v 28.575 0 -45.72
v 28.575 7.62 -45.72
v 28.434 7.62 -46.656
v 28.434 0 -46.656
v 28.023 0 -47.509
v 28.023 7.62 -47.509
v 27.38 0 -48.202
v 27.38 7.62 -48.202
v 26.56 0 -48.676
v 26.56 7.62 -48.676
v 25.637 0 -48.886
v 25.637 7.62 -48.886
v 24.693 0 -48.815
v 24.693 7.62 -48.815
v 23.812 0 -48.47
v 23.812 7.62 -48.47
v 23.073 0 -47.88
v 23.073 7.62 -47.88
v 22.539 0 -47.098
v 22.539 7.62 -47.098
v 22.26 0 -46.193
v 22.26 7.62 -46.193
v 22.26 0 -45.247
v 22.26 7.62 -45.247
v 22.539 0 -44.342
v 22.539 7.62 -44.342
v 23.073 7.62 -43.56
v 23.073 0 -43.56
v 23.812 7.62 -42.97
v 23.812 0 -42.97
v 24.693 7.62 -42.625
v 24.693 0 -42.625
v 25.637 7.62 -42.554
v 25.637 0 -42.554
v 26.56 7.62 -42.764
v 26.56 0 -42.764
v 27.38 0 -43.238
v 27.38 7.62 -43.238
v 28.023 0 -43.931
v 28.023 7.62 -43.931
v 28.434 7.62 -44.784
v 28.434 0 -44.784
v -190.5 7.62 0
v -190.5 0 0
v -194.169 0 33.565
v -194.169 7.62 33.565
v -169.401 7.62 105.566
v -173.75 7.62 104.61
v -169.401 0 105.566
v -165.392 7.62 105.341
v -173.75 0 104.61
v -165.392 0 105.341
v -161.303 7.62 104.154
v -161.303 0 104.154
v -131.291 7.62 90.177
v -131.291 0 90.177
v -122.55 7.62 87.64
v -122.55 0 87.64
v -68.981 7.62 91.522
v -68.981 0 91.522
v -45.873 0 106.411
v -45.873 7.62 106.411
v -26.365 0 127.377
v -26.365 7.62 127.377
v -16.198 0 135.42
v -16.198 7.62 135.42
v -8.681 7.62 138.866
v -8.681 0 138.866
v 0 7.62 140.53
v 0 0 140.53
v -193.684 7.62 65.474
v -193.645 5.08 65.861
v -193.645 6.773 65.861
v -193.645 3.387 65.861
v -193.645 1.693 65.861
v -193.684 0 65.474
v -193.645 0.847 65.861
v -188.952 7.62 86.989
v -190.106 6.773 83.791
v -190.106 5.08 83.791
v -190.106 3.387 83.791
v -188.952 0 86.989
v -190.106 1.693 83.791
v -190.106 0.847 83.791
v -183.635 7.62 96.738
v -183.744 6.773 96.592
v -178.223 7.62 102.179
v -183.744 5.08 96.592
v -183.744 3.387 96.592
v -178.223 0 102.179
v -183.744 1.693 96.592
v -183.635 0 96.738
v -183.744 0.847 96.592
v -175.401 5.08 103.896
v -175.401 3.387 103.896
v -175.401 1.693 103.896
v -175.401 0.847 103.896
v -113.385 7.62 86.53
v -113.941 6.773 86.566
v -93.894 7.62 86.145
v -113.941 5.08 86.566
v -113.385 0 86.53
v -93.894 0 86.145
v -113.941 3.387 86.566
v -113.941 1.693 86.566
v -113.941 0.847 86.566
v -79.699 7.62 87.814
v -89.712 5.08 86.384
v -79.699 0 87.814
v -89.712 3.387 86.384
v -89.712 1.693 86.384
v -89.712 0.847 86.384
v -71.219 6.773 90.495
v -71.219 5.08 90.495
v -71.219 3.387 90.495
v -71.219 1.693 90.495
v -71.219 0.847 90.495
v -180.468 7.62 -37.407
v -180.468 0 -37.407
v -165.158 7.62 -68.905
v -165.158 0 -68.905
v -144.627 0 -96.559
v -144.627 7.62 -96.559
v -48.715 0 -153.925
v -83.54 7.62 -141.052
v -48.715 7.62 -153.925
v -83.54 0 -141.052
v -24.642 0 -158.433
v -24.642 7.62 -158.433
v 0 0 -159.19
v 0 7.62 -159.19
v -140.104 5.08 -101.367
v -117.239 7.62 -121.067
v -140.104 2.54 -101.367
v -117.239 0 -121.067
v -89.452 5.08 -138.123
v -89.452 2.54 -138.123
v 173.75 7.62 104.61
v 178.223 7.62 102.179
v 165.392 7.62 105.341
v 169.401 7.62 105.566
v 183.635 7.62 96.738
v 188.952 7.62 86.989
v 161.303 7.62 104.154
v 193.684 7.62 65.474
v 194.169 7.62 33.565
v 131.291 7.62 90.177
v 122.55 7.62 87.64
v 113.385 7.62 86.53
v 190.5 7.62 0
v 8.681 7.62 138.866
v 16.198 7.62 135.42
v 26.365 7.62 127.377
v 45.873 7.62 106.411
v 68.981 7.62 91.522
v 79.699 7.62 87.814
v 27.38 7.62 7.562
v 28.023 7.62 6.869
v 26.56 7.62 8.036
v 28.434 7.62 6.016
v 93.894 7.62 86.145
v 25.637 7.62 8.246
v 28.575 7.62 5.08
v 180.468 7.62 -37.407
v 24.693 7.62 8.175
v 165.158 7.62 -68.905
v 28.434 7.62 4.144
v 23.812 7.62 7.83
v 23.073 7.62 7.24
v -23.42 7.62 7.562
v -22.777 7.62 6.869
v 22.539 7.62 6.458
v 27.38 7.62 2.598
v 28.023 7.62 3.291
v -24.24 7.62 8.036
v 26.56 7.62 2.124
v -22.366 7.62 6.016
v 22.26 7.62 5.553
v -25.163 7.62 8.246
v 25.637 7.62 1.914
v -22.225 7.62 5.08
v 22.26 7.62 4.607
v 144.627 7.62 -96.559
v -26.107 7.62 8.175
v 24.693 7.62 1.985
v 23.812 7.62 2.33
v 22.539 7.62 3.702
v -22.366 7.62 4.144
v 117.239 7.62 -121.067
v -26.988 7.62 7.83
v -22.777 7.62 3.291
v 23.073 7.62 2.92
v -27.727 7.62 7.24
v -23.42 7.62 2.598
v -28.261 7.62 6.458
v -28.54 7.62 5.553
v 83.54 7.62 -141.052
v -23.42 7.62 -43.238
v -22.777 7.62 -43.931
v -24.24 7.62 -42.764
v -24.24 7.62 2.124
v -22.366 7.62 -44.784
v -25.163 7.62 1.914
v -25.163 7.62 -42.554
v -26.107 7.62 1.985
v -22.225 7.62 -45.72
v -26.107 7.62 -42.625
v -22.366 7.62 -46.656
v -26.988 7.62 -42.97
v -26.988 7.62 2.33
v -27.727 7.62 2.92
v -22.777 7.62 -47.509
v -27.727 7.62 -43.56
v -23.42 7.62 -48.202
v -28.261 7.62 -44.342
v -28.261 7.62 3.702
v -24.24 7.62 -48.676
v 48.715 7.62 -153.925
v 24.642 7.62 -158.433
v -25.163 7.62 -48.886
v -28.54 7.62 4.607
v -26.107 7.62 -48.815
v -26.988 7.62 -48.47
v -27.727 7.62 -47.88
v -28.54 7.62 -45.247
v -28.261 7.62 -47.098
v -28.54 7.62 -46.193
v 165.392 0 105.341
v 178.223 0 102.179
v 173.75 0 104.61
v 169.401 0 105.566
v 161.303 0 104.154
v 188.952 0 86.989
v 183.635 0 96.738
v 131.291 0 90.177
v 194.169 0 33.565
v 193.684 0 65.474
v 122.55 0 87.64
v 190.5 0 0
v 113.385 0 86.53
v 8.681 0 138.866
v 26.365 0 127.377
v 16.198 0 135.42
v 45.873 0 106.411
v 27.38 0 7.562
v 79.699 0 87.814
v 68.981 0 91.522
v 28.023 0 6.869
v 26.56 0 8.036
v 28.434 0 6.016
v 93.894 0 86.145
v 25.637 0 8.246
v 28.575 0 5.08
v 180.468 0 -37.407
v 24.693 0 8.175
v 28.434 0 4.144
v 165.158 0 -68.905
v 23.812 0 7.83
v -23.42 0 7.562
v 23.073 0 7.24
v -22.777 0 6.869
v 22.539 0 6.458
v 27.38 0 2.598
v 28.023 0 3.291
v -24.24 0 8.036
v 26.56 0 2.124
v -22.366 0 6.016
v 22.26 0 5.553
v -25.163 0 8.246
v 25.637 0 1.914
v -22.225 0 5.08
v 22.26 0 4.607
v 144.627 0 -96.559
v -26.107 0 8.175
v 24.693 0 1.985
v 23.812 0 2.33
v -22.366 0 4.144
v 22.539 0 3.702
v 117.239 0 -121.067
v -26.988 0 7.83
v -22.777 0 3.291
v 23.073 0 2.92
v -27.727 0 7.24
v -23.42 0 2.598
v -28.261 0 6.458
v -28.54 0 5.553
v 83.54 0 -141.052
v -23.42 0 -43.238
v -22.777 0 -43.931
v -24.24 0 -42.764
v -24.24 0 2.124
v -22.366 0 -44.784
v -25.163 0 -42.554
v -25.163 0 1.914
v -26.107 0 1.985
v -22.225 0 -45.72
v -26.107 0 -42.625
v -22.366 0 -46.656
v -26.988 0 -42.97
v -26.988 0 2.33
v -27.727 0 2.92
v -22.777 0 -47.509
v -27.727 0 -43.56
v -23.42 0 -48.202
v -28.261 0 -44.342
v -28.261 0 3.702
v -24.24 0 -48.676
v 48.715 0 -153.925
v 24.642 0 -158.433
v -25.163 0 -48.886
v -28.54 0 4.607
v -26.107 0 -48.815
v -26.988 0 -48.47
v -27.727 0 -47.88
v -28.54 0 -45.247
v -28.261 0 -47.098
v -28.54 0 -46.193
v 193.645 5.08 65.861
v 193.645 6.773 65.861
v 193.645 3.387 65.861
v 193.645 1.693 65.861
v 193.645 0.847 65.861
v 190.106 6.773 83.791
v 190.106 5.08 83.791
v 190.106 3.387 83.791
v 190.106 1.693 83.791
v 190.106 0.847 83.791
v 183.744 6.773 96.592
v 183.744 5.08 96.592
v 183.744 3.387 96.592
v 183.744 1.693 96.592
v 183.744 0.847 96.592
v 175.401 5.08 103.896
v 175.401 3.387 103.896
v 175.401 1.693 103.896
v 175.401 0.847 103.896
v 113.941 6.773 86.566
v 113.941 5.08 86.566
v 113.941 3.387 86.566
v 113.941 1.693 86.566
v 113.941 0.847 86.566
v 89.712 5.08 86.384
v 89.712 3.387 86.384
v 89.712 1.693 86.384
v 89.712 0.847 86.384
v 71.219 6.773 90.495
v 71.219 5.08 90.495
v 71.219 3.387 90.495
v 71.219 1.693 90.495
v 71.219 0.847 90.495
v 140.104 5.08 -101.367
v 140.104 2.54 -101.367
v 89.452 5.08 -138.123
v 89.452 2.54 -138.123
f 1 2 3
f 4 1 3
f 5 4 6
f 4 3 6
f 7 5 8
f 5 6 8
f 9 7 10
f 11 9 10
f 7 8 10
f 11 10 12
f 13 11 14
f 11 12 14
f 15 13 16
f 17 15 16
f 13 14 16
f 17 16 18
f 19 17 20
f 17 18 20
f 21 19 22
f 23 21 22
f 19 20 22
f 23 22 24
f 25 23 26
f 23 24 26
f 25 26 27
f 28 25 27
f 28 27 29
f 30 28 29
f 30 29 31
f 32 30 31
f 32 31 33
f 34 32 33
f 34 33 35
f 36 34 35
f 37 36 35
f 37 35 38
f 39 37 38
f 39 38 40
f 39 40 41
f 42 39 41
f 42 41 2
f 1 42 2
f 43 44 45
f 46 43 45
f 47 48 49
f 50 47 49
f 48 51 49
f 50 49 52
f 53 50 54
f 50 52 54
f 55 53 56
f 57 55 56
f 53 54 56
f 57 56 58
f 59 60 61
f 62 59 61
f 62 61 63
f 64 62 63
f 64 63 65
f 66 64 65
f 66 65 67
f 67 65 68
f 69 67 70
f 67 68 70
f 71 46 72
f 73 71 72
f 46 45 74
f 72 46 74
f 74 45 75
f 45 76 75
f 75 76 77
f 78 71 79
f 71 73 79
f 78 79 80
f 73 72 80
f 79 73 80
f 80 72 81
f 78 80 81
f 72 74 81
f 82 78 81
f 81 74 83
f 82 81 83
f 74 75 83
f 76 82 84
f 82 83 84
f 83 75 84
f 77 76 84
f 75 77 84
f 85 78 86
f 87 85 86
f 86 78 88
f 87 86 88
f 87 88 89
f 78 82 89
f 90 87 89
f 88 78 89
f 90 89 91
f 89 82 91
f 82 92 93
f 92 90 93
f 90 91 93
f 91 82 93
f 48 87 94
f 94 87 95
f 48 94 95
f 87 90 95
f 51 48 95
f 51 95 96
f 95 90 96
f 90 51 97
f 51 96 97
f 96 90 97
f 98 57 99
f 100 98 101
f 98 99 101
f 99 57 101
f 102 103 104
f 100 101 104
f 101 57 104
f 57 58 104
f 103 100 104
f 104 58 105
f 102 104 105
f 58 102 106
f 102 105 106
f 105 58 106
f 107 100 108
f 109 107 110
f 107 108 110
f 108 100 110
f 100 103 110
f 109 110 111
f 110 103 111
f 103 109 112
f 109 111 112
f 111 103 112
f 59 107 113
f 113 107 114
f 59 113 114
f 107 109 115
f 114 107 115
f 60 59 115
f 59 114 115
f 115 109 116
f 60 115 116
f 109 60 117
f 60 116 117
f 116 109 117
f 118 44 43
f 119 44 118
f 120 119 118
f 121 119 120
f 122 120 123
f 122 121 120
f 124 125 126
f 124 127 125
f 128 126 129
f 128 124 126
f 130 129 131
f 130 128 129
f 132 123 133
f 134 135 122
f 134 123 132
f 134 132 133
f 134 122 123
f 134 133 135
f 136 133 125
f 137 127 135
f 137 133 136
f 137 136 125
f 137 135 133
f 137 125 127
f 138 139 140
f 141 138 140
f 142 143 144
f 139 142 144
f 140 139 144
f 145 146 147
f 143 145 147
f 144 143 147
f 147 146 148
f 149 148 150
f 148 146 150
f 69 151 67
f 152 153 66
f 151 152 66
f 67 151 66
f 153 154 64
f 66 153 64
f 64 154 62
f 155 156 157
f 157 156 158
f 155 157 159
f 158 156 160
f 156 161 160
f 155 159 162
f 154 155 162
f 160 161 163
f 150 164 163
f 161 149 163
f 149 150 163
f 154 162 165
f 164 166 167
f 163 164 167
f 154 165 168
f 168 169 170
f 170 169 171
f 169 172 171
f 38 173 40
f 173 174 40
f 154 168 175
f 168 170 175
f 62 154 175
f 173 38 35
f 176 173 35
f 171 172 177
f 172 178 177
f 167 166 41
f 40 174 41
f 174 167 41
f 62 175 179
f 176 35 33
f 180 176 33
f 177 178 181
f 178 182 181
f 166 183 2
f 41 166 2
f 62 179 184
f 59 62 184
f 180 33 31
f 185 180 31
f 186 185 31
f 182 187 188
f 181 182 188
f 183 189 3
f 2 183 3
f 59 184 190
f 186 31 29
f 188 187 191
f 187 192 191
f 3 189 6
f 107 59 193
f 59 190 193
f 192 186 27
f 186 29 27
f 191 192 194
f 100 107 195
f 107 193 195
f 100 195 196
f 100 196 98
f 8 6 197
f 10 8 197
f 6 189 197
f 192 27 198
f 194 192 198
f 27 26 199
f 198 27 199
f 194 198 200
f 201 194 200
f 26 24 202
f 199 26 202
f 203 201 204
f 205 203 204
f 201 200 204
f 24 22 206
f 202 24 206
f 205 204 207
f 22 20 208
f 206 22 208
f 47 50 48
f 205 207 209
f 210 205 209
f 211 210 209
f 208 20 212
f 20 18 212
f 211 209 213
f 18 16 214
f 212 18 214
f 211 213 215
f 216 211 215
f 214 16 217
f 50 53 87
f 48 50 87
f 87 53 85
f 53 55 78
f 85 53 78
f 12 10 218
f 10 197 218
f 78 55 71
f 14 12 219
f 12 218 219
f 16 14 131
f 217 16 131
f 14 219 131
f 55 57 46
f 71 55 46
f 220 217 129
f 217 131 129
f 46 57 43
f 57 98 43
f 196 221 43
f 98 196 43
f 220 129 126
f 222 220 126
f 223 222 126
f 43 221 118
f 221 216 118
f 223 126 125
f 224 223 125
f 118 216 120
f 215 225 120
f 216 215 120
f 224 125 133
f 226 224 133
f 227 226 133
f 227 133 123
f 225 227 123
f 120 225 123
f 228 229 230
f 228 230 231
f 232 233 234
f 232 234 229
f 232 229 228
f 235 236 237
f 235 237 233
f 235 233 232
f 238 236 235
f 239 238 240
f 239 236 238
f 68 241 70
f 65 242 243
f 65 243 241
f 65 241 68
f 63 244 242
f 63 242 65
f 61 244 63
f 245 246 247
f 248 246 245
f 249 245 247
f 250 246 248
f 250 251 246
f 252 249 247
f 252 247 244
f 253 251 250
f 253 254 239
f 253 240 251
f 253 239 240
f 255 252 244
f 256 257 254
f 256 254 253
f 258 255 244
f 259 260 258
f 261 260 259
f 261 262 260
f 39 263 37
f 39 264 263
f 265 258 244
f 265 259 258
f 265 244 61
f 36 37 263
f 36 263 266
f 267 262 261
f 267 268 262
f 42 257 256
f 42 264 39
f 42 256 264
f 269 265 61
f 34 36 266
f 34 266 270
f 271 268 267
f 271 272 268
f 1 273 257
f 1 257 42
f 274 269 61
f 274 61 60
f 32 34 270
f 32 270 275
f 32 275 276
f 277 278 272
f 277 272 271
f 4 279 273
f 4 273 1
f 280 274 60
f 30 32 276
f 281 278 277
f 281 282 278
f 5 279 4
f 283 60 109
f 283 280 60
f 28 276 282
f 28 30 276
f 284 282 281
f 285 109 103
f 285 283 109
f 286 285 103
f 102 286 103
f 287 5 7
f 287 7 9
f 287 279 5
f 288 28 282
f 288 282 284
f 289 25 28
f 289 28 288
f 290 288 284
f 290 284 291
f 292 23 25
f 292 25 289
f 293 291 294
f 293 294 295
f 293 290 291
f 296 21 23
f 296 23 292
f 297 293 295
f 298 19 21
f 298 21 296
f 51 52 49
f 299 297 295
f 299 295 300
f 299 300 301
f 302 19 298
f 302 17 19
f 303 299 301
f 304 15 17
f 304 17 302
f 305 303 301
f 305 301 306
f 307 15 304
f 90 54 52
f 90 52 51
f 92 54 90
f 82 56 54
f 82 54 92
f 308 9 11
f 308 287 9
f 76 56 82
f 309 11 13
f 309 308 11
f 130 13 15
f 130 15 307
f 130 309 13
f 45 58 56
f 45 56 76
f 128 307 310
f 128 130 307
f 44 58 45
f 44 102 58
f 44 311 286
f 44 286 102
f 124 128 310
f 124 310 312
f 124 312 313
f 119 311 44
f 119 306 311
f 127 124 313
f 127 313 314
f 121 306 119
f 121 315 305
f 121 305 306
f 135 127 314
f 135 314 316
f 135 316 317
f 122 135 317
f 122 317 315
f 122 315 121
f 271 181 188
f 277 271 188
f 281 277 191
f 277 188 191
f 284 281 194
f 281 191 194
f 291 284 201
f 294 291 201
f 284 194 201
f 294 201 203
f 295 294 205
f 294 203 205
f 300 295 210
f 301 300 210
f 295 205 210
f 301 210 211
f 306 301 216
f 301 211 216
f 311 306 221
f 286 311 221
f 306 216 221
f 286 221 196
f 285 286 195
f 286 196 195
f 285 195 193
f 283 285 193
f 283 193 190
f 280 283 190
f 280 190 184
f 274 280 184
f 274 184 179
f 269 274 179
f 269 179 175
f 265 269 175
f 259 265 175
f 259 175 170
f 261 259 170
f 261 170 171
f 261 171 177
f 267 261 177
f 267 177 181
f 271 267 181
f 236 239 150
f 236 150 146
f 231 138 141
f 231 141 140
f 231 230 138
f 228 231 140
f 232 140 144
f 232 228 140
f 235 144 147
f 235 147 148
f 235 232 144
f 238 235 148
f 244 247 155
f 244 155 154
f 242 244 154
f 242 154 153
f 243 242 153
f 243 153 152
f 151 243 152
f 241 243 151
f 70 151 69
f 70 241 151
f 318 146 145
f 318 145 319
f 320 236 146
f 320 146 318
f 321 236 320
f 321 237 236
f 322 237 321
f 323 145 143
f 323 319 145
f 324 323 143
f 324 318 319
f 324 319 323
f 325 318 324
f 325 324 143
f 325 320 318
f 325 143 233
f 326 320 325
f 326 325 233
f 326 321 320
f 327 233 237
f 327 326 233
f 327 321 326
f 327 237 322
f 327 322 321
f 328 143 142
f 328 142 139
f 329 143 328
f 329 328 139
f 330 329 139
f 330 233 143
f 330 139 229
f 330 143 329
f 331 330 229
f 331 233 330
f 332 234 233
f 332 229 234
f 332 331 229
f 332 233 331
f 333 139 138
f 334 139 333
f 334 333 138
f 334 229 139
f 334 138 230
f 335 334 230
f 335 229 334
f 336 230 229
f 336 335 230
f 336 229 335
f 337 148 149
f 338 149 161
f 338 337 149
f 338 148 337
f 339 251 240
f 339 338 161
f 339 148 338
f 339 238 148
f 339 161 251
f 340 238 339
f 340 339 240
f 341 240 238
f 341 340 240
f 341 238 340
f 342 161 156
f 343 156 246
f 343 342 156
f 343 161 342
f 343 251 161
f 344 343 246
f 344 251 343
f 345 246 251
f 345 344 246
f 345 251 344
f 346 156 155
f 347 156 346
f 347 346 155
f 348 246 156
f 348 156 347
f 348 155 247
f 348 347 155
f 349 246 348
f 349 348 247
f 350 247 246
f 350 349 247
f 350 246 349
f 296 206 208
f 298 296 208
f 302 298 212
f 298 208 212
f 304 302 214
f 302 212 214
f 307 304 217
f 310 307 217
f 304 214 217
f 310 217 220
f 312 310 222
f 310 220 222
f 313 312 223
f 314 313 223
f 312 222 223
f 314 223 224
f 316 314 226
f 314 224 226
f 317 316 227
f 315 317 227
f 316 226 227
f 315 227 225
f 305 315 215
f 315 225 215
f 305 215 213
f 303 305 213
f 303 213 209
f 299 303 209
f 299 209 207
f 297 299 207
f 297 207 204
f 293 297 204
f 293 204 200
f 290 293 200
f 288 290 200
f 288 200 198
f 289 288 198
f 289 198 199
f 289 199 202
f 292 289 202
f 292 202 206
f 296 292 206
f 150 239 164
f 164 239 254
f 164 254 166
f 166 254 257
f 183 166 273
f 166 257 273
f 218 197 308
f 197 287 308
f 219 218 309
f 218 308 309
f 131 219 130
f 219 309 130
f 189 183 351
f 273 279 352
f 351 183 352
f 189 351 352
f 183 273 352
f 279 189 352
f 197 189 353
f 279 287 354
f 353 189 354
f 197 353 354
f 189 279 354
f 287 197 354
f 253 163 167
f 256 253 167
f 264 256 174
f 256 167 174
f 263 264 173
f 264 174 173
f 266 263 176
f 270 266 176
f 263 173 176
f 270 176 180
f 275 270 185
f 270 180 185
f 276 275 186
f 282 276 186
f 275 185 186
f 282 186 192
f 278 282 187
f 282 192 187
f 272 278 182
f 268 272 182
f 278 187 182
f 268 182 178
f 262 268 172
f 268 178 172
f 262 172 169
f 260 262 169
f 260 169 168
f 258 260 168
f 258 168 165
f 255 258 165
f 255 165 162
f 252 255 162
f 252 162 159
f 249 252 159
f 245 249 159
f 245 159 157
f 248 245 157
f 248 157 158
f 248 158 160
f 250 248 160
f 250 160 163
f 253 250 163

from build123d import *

# Parameters (mm, degrees)
BOSS_EXTRUDE1_DEPTH         = 7.62
F_1_4_0_25_DIAMETER_HOLE1_D = 6.35


with BuildPart() as part:
    # Sketch3 → Boss-Extrude1 (new body)
    with BuildSketch(Plane(origin=(0, 0, 0), x_dir=(1, 0, 0), z_dir=(0, 1, 0))):
        with BuildLine():
            add(Edge.make_bspline(
                [(-190.5, 0), (-184.392726562, 37.537038237), (-157.261289847, 93.964093485), (-82.387478202, 146.622658841), (-31.311374143, 160.799884185), (0, 159.189909928)],
                knots=[0, 0, 0, 0, 0.424401366, 0.656369581, 1, 1, 1, 1], degree=3))
            add(Edge.make_bspline(
                [(190.5, 0), (184.392726562, 37.537038237), (157.261289847, 93.964093485), (82.387478202, 146.622658841), (31.311374143, 160.799884185), (0, 159.189909928)],
                knots=[0, 0, 0, 0, 0.424401366, 0.656369581, 1, 1, 1, 1], degree=3))
            add(Edge.make_bspline(
                [(190.5, 0), (192.064011793, -4.963501926), (201.967167766, -83.314618311), (174.696602041, -109.289958804), (151.630121659, -100.567984898), (131.410771519, -87.719783961), (96.843567628, -85.375403377), (78.692510144, -86.25882742), (58.833533072, -96.87938247), (37.30593461, -109.935798162), (21.349613946, -139.114767457), (0, -140.530090072)],
                knots=[0, 0, 0, 0, 0.166997052, 0.292320514, 0.319633117, 0.42673531, 0.45891405, 0.609241775, 0.641909704, 0.76680237, 1, 1, 1, 1], degree=3))
            add(Edge.make_bspline(
                [(-190.5, 0), (-192.064011793, -4.963501926), (-201.967167766, -83.314618311), (-174.696602041, -109.289958804), (-151.630121659, -100.567984898), (-131.410771519, -87.719783961), (-96.843567628, -85.375403377), (-78.692510144, -86.25882742), (-58.833533072, -96.87938247), (-37.30593461, -109.935798162), (-21.349613946, -139.114767457), (0, -140.530090072)],
                knots=[0, 0, 0, 0, 0.166997052, 0.292320514, 0.319633117, 0.42673531, 0.45891405, 0.609241775, 0.641909704, 0.76680237, 1, 1, 1, 1], degree=3))
        make_face()
    extrude(amount=BOSS_EXTRUDE1_DEPTH)

    # 1/4 (0.25) Diameter Hole1 (through all)
    with Locations(Plane(origin=(0, 0, 0), x_dir=(-1, 0, 0), z_dir=(0, -1, 0))):
        with Locations((-25.4, 45.72), (25.4, 45.72), (25.4, -5.08), (-25.4, -5.08)):
            Hole(F_1_4_0_25_DIAMETER_HOLE1_D / 2)


solid = part.part
